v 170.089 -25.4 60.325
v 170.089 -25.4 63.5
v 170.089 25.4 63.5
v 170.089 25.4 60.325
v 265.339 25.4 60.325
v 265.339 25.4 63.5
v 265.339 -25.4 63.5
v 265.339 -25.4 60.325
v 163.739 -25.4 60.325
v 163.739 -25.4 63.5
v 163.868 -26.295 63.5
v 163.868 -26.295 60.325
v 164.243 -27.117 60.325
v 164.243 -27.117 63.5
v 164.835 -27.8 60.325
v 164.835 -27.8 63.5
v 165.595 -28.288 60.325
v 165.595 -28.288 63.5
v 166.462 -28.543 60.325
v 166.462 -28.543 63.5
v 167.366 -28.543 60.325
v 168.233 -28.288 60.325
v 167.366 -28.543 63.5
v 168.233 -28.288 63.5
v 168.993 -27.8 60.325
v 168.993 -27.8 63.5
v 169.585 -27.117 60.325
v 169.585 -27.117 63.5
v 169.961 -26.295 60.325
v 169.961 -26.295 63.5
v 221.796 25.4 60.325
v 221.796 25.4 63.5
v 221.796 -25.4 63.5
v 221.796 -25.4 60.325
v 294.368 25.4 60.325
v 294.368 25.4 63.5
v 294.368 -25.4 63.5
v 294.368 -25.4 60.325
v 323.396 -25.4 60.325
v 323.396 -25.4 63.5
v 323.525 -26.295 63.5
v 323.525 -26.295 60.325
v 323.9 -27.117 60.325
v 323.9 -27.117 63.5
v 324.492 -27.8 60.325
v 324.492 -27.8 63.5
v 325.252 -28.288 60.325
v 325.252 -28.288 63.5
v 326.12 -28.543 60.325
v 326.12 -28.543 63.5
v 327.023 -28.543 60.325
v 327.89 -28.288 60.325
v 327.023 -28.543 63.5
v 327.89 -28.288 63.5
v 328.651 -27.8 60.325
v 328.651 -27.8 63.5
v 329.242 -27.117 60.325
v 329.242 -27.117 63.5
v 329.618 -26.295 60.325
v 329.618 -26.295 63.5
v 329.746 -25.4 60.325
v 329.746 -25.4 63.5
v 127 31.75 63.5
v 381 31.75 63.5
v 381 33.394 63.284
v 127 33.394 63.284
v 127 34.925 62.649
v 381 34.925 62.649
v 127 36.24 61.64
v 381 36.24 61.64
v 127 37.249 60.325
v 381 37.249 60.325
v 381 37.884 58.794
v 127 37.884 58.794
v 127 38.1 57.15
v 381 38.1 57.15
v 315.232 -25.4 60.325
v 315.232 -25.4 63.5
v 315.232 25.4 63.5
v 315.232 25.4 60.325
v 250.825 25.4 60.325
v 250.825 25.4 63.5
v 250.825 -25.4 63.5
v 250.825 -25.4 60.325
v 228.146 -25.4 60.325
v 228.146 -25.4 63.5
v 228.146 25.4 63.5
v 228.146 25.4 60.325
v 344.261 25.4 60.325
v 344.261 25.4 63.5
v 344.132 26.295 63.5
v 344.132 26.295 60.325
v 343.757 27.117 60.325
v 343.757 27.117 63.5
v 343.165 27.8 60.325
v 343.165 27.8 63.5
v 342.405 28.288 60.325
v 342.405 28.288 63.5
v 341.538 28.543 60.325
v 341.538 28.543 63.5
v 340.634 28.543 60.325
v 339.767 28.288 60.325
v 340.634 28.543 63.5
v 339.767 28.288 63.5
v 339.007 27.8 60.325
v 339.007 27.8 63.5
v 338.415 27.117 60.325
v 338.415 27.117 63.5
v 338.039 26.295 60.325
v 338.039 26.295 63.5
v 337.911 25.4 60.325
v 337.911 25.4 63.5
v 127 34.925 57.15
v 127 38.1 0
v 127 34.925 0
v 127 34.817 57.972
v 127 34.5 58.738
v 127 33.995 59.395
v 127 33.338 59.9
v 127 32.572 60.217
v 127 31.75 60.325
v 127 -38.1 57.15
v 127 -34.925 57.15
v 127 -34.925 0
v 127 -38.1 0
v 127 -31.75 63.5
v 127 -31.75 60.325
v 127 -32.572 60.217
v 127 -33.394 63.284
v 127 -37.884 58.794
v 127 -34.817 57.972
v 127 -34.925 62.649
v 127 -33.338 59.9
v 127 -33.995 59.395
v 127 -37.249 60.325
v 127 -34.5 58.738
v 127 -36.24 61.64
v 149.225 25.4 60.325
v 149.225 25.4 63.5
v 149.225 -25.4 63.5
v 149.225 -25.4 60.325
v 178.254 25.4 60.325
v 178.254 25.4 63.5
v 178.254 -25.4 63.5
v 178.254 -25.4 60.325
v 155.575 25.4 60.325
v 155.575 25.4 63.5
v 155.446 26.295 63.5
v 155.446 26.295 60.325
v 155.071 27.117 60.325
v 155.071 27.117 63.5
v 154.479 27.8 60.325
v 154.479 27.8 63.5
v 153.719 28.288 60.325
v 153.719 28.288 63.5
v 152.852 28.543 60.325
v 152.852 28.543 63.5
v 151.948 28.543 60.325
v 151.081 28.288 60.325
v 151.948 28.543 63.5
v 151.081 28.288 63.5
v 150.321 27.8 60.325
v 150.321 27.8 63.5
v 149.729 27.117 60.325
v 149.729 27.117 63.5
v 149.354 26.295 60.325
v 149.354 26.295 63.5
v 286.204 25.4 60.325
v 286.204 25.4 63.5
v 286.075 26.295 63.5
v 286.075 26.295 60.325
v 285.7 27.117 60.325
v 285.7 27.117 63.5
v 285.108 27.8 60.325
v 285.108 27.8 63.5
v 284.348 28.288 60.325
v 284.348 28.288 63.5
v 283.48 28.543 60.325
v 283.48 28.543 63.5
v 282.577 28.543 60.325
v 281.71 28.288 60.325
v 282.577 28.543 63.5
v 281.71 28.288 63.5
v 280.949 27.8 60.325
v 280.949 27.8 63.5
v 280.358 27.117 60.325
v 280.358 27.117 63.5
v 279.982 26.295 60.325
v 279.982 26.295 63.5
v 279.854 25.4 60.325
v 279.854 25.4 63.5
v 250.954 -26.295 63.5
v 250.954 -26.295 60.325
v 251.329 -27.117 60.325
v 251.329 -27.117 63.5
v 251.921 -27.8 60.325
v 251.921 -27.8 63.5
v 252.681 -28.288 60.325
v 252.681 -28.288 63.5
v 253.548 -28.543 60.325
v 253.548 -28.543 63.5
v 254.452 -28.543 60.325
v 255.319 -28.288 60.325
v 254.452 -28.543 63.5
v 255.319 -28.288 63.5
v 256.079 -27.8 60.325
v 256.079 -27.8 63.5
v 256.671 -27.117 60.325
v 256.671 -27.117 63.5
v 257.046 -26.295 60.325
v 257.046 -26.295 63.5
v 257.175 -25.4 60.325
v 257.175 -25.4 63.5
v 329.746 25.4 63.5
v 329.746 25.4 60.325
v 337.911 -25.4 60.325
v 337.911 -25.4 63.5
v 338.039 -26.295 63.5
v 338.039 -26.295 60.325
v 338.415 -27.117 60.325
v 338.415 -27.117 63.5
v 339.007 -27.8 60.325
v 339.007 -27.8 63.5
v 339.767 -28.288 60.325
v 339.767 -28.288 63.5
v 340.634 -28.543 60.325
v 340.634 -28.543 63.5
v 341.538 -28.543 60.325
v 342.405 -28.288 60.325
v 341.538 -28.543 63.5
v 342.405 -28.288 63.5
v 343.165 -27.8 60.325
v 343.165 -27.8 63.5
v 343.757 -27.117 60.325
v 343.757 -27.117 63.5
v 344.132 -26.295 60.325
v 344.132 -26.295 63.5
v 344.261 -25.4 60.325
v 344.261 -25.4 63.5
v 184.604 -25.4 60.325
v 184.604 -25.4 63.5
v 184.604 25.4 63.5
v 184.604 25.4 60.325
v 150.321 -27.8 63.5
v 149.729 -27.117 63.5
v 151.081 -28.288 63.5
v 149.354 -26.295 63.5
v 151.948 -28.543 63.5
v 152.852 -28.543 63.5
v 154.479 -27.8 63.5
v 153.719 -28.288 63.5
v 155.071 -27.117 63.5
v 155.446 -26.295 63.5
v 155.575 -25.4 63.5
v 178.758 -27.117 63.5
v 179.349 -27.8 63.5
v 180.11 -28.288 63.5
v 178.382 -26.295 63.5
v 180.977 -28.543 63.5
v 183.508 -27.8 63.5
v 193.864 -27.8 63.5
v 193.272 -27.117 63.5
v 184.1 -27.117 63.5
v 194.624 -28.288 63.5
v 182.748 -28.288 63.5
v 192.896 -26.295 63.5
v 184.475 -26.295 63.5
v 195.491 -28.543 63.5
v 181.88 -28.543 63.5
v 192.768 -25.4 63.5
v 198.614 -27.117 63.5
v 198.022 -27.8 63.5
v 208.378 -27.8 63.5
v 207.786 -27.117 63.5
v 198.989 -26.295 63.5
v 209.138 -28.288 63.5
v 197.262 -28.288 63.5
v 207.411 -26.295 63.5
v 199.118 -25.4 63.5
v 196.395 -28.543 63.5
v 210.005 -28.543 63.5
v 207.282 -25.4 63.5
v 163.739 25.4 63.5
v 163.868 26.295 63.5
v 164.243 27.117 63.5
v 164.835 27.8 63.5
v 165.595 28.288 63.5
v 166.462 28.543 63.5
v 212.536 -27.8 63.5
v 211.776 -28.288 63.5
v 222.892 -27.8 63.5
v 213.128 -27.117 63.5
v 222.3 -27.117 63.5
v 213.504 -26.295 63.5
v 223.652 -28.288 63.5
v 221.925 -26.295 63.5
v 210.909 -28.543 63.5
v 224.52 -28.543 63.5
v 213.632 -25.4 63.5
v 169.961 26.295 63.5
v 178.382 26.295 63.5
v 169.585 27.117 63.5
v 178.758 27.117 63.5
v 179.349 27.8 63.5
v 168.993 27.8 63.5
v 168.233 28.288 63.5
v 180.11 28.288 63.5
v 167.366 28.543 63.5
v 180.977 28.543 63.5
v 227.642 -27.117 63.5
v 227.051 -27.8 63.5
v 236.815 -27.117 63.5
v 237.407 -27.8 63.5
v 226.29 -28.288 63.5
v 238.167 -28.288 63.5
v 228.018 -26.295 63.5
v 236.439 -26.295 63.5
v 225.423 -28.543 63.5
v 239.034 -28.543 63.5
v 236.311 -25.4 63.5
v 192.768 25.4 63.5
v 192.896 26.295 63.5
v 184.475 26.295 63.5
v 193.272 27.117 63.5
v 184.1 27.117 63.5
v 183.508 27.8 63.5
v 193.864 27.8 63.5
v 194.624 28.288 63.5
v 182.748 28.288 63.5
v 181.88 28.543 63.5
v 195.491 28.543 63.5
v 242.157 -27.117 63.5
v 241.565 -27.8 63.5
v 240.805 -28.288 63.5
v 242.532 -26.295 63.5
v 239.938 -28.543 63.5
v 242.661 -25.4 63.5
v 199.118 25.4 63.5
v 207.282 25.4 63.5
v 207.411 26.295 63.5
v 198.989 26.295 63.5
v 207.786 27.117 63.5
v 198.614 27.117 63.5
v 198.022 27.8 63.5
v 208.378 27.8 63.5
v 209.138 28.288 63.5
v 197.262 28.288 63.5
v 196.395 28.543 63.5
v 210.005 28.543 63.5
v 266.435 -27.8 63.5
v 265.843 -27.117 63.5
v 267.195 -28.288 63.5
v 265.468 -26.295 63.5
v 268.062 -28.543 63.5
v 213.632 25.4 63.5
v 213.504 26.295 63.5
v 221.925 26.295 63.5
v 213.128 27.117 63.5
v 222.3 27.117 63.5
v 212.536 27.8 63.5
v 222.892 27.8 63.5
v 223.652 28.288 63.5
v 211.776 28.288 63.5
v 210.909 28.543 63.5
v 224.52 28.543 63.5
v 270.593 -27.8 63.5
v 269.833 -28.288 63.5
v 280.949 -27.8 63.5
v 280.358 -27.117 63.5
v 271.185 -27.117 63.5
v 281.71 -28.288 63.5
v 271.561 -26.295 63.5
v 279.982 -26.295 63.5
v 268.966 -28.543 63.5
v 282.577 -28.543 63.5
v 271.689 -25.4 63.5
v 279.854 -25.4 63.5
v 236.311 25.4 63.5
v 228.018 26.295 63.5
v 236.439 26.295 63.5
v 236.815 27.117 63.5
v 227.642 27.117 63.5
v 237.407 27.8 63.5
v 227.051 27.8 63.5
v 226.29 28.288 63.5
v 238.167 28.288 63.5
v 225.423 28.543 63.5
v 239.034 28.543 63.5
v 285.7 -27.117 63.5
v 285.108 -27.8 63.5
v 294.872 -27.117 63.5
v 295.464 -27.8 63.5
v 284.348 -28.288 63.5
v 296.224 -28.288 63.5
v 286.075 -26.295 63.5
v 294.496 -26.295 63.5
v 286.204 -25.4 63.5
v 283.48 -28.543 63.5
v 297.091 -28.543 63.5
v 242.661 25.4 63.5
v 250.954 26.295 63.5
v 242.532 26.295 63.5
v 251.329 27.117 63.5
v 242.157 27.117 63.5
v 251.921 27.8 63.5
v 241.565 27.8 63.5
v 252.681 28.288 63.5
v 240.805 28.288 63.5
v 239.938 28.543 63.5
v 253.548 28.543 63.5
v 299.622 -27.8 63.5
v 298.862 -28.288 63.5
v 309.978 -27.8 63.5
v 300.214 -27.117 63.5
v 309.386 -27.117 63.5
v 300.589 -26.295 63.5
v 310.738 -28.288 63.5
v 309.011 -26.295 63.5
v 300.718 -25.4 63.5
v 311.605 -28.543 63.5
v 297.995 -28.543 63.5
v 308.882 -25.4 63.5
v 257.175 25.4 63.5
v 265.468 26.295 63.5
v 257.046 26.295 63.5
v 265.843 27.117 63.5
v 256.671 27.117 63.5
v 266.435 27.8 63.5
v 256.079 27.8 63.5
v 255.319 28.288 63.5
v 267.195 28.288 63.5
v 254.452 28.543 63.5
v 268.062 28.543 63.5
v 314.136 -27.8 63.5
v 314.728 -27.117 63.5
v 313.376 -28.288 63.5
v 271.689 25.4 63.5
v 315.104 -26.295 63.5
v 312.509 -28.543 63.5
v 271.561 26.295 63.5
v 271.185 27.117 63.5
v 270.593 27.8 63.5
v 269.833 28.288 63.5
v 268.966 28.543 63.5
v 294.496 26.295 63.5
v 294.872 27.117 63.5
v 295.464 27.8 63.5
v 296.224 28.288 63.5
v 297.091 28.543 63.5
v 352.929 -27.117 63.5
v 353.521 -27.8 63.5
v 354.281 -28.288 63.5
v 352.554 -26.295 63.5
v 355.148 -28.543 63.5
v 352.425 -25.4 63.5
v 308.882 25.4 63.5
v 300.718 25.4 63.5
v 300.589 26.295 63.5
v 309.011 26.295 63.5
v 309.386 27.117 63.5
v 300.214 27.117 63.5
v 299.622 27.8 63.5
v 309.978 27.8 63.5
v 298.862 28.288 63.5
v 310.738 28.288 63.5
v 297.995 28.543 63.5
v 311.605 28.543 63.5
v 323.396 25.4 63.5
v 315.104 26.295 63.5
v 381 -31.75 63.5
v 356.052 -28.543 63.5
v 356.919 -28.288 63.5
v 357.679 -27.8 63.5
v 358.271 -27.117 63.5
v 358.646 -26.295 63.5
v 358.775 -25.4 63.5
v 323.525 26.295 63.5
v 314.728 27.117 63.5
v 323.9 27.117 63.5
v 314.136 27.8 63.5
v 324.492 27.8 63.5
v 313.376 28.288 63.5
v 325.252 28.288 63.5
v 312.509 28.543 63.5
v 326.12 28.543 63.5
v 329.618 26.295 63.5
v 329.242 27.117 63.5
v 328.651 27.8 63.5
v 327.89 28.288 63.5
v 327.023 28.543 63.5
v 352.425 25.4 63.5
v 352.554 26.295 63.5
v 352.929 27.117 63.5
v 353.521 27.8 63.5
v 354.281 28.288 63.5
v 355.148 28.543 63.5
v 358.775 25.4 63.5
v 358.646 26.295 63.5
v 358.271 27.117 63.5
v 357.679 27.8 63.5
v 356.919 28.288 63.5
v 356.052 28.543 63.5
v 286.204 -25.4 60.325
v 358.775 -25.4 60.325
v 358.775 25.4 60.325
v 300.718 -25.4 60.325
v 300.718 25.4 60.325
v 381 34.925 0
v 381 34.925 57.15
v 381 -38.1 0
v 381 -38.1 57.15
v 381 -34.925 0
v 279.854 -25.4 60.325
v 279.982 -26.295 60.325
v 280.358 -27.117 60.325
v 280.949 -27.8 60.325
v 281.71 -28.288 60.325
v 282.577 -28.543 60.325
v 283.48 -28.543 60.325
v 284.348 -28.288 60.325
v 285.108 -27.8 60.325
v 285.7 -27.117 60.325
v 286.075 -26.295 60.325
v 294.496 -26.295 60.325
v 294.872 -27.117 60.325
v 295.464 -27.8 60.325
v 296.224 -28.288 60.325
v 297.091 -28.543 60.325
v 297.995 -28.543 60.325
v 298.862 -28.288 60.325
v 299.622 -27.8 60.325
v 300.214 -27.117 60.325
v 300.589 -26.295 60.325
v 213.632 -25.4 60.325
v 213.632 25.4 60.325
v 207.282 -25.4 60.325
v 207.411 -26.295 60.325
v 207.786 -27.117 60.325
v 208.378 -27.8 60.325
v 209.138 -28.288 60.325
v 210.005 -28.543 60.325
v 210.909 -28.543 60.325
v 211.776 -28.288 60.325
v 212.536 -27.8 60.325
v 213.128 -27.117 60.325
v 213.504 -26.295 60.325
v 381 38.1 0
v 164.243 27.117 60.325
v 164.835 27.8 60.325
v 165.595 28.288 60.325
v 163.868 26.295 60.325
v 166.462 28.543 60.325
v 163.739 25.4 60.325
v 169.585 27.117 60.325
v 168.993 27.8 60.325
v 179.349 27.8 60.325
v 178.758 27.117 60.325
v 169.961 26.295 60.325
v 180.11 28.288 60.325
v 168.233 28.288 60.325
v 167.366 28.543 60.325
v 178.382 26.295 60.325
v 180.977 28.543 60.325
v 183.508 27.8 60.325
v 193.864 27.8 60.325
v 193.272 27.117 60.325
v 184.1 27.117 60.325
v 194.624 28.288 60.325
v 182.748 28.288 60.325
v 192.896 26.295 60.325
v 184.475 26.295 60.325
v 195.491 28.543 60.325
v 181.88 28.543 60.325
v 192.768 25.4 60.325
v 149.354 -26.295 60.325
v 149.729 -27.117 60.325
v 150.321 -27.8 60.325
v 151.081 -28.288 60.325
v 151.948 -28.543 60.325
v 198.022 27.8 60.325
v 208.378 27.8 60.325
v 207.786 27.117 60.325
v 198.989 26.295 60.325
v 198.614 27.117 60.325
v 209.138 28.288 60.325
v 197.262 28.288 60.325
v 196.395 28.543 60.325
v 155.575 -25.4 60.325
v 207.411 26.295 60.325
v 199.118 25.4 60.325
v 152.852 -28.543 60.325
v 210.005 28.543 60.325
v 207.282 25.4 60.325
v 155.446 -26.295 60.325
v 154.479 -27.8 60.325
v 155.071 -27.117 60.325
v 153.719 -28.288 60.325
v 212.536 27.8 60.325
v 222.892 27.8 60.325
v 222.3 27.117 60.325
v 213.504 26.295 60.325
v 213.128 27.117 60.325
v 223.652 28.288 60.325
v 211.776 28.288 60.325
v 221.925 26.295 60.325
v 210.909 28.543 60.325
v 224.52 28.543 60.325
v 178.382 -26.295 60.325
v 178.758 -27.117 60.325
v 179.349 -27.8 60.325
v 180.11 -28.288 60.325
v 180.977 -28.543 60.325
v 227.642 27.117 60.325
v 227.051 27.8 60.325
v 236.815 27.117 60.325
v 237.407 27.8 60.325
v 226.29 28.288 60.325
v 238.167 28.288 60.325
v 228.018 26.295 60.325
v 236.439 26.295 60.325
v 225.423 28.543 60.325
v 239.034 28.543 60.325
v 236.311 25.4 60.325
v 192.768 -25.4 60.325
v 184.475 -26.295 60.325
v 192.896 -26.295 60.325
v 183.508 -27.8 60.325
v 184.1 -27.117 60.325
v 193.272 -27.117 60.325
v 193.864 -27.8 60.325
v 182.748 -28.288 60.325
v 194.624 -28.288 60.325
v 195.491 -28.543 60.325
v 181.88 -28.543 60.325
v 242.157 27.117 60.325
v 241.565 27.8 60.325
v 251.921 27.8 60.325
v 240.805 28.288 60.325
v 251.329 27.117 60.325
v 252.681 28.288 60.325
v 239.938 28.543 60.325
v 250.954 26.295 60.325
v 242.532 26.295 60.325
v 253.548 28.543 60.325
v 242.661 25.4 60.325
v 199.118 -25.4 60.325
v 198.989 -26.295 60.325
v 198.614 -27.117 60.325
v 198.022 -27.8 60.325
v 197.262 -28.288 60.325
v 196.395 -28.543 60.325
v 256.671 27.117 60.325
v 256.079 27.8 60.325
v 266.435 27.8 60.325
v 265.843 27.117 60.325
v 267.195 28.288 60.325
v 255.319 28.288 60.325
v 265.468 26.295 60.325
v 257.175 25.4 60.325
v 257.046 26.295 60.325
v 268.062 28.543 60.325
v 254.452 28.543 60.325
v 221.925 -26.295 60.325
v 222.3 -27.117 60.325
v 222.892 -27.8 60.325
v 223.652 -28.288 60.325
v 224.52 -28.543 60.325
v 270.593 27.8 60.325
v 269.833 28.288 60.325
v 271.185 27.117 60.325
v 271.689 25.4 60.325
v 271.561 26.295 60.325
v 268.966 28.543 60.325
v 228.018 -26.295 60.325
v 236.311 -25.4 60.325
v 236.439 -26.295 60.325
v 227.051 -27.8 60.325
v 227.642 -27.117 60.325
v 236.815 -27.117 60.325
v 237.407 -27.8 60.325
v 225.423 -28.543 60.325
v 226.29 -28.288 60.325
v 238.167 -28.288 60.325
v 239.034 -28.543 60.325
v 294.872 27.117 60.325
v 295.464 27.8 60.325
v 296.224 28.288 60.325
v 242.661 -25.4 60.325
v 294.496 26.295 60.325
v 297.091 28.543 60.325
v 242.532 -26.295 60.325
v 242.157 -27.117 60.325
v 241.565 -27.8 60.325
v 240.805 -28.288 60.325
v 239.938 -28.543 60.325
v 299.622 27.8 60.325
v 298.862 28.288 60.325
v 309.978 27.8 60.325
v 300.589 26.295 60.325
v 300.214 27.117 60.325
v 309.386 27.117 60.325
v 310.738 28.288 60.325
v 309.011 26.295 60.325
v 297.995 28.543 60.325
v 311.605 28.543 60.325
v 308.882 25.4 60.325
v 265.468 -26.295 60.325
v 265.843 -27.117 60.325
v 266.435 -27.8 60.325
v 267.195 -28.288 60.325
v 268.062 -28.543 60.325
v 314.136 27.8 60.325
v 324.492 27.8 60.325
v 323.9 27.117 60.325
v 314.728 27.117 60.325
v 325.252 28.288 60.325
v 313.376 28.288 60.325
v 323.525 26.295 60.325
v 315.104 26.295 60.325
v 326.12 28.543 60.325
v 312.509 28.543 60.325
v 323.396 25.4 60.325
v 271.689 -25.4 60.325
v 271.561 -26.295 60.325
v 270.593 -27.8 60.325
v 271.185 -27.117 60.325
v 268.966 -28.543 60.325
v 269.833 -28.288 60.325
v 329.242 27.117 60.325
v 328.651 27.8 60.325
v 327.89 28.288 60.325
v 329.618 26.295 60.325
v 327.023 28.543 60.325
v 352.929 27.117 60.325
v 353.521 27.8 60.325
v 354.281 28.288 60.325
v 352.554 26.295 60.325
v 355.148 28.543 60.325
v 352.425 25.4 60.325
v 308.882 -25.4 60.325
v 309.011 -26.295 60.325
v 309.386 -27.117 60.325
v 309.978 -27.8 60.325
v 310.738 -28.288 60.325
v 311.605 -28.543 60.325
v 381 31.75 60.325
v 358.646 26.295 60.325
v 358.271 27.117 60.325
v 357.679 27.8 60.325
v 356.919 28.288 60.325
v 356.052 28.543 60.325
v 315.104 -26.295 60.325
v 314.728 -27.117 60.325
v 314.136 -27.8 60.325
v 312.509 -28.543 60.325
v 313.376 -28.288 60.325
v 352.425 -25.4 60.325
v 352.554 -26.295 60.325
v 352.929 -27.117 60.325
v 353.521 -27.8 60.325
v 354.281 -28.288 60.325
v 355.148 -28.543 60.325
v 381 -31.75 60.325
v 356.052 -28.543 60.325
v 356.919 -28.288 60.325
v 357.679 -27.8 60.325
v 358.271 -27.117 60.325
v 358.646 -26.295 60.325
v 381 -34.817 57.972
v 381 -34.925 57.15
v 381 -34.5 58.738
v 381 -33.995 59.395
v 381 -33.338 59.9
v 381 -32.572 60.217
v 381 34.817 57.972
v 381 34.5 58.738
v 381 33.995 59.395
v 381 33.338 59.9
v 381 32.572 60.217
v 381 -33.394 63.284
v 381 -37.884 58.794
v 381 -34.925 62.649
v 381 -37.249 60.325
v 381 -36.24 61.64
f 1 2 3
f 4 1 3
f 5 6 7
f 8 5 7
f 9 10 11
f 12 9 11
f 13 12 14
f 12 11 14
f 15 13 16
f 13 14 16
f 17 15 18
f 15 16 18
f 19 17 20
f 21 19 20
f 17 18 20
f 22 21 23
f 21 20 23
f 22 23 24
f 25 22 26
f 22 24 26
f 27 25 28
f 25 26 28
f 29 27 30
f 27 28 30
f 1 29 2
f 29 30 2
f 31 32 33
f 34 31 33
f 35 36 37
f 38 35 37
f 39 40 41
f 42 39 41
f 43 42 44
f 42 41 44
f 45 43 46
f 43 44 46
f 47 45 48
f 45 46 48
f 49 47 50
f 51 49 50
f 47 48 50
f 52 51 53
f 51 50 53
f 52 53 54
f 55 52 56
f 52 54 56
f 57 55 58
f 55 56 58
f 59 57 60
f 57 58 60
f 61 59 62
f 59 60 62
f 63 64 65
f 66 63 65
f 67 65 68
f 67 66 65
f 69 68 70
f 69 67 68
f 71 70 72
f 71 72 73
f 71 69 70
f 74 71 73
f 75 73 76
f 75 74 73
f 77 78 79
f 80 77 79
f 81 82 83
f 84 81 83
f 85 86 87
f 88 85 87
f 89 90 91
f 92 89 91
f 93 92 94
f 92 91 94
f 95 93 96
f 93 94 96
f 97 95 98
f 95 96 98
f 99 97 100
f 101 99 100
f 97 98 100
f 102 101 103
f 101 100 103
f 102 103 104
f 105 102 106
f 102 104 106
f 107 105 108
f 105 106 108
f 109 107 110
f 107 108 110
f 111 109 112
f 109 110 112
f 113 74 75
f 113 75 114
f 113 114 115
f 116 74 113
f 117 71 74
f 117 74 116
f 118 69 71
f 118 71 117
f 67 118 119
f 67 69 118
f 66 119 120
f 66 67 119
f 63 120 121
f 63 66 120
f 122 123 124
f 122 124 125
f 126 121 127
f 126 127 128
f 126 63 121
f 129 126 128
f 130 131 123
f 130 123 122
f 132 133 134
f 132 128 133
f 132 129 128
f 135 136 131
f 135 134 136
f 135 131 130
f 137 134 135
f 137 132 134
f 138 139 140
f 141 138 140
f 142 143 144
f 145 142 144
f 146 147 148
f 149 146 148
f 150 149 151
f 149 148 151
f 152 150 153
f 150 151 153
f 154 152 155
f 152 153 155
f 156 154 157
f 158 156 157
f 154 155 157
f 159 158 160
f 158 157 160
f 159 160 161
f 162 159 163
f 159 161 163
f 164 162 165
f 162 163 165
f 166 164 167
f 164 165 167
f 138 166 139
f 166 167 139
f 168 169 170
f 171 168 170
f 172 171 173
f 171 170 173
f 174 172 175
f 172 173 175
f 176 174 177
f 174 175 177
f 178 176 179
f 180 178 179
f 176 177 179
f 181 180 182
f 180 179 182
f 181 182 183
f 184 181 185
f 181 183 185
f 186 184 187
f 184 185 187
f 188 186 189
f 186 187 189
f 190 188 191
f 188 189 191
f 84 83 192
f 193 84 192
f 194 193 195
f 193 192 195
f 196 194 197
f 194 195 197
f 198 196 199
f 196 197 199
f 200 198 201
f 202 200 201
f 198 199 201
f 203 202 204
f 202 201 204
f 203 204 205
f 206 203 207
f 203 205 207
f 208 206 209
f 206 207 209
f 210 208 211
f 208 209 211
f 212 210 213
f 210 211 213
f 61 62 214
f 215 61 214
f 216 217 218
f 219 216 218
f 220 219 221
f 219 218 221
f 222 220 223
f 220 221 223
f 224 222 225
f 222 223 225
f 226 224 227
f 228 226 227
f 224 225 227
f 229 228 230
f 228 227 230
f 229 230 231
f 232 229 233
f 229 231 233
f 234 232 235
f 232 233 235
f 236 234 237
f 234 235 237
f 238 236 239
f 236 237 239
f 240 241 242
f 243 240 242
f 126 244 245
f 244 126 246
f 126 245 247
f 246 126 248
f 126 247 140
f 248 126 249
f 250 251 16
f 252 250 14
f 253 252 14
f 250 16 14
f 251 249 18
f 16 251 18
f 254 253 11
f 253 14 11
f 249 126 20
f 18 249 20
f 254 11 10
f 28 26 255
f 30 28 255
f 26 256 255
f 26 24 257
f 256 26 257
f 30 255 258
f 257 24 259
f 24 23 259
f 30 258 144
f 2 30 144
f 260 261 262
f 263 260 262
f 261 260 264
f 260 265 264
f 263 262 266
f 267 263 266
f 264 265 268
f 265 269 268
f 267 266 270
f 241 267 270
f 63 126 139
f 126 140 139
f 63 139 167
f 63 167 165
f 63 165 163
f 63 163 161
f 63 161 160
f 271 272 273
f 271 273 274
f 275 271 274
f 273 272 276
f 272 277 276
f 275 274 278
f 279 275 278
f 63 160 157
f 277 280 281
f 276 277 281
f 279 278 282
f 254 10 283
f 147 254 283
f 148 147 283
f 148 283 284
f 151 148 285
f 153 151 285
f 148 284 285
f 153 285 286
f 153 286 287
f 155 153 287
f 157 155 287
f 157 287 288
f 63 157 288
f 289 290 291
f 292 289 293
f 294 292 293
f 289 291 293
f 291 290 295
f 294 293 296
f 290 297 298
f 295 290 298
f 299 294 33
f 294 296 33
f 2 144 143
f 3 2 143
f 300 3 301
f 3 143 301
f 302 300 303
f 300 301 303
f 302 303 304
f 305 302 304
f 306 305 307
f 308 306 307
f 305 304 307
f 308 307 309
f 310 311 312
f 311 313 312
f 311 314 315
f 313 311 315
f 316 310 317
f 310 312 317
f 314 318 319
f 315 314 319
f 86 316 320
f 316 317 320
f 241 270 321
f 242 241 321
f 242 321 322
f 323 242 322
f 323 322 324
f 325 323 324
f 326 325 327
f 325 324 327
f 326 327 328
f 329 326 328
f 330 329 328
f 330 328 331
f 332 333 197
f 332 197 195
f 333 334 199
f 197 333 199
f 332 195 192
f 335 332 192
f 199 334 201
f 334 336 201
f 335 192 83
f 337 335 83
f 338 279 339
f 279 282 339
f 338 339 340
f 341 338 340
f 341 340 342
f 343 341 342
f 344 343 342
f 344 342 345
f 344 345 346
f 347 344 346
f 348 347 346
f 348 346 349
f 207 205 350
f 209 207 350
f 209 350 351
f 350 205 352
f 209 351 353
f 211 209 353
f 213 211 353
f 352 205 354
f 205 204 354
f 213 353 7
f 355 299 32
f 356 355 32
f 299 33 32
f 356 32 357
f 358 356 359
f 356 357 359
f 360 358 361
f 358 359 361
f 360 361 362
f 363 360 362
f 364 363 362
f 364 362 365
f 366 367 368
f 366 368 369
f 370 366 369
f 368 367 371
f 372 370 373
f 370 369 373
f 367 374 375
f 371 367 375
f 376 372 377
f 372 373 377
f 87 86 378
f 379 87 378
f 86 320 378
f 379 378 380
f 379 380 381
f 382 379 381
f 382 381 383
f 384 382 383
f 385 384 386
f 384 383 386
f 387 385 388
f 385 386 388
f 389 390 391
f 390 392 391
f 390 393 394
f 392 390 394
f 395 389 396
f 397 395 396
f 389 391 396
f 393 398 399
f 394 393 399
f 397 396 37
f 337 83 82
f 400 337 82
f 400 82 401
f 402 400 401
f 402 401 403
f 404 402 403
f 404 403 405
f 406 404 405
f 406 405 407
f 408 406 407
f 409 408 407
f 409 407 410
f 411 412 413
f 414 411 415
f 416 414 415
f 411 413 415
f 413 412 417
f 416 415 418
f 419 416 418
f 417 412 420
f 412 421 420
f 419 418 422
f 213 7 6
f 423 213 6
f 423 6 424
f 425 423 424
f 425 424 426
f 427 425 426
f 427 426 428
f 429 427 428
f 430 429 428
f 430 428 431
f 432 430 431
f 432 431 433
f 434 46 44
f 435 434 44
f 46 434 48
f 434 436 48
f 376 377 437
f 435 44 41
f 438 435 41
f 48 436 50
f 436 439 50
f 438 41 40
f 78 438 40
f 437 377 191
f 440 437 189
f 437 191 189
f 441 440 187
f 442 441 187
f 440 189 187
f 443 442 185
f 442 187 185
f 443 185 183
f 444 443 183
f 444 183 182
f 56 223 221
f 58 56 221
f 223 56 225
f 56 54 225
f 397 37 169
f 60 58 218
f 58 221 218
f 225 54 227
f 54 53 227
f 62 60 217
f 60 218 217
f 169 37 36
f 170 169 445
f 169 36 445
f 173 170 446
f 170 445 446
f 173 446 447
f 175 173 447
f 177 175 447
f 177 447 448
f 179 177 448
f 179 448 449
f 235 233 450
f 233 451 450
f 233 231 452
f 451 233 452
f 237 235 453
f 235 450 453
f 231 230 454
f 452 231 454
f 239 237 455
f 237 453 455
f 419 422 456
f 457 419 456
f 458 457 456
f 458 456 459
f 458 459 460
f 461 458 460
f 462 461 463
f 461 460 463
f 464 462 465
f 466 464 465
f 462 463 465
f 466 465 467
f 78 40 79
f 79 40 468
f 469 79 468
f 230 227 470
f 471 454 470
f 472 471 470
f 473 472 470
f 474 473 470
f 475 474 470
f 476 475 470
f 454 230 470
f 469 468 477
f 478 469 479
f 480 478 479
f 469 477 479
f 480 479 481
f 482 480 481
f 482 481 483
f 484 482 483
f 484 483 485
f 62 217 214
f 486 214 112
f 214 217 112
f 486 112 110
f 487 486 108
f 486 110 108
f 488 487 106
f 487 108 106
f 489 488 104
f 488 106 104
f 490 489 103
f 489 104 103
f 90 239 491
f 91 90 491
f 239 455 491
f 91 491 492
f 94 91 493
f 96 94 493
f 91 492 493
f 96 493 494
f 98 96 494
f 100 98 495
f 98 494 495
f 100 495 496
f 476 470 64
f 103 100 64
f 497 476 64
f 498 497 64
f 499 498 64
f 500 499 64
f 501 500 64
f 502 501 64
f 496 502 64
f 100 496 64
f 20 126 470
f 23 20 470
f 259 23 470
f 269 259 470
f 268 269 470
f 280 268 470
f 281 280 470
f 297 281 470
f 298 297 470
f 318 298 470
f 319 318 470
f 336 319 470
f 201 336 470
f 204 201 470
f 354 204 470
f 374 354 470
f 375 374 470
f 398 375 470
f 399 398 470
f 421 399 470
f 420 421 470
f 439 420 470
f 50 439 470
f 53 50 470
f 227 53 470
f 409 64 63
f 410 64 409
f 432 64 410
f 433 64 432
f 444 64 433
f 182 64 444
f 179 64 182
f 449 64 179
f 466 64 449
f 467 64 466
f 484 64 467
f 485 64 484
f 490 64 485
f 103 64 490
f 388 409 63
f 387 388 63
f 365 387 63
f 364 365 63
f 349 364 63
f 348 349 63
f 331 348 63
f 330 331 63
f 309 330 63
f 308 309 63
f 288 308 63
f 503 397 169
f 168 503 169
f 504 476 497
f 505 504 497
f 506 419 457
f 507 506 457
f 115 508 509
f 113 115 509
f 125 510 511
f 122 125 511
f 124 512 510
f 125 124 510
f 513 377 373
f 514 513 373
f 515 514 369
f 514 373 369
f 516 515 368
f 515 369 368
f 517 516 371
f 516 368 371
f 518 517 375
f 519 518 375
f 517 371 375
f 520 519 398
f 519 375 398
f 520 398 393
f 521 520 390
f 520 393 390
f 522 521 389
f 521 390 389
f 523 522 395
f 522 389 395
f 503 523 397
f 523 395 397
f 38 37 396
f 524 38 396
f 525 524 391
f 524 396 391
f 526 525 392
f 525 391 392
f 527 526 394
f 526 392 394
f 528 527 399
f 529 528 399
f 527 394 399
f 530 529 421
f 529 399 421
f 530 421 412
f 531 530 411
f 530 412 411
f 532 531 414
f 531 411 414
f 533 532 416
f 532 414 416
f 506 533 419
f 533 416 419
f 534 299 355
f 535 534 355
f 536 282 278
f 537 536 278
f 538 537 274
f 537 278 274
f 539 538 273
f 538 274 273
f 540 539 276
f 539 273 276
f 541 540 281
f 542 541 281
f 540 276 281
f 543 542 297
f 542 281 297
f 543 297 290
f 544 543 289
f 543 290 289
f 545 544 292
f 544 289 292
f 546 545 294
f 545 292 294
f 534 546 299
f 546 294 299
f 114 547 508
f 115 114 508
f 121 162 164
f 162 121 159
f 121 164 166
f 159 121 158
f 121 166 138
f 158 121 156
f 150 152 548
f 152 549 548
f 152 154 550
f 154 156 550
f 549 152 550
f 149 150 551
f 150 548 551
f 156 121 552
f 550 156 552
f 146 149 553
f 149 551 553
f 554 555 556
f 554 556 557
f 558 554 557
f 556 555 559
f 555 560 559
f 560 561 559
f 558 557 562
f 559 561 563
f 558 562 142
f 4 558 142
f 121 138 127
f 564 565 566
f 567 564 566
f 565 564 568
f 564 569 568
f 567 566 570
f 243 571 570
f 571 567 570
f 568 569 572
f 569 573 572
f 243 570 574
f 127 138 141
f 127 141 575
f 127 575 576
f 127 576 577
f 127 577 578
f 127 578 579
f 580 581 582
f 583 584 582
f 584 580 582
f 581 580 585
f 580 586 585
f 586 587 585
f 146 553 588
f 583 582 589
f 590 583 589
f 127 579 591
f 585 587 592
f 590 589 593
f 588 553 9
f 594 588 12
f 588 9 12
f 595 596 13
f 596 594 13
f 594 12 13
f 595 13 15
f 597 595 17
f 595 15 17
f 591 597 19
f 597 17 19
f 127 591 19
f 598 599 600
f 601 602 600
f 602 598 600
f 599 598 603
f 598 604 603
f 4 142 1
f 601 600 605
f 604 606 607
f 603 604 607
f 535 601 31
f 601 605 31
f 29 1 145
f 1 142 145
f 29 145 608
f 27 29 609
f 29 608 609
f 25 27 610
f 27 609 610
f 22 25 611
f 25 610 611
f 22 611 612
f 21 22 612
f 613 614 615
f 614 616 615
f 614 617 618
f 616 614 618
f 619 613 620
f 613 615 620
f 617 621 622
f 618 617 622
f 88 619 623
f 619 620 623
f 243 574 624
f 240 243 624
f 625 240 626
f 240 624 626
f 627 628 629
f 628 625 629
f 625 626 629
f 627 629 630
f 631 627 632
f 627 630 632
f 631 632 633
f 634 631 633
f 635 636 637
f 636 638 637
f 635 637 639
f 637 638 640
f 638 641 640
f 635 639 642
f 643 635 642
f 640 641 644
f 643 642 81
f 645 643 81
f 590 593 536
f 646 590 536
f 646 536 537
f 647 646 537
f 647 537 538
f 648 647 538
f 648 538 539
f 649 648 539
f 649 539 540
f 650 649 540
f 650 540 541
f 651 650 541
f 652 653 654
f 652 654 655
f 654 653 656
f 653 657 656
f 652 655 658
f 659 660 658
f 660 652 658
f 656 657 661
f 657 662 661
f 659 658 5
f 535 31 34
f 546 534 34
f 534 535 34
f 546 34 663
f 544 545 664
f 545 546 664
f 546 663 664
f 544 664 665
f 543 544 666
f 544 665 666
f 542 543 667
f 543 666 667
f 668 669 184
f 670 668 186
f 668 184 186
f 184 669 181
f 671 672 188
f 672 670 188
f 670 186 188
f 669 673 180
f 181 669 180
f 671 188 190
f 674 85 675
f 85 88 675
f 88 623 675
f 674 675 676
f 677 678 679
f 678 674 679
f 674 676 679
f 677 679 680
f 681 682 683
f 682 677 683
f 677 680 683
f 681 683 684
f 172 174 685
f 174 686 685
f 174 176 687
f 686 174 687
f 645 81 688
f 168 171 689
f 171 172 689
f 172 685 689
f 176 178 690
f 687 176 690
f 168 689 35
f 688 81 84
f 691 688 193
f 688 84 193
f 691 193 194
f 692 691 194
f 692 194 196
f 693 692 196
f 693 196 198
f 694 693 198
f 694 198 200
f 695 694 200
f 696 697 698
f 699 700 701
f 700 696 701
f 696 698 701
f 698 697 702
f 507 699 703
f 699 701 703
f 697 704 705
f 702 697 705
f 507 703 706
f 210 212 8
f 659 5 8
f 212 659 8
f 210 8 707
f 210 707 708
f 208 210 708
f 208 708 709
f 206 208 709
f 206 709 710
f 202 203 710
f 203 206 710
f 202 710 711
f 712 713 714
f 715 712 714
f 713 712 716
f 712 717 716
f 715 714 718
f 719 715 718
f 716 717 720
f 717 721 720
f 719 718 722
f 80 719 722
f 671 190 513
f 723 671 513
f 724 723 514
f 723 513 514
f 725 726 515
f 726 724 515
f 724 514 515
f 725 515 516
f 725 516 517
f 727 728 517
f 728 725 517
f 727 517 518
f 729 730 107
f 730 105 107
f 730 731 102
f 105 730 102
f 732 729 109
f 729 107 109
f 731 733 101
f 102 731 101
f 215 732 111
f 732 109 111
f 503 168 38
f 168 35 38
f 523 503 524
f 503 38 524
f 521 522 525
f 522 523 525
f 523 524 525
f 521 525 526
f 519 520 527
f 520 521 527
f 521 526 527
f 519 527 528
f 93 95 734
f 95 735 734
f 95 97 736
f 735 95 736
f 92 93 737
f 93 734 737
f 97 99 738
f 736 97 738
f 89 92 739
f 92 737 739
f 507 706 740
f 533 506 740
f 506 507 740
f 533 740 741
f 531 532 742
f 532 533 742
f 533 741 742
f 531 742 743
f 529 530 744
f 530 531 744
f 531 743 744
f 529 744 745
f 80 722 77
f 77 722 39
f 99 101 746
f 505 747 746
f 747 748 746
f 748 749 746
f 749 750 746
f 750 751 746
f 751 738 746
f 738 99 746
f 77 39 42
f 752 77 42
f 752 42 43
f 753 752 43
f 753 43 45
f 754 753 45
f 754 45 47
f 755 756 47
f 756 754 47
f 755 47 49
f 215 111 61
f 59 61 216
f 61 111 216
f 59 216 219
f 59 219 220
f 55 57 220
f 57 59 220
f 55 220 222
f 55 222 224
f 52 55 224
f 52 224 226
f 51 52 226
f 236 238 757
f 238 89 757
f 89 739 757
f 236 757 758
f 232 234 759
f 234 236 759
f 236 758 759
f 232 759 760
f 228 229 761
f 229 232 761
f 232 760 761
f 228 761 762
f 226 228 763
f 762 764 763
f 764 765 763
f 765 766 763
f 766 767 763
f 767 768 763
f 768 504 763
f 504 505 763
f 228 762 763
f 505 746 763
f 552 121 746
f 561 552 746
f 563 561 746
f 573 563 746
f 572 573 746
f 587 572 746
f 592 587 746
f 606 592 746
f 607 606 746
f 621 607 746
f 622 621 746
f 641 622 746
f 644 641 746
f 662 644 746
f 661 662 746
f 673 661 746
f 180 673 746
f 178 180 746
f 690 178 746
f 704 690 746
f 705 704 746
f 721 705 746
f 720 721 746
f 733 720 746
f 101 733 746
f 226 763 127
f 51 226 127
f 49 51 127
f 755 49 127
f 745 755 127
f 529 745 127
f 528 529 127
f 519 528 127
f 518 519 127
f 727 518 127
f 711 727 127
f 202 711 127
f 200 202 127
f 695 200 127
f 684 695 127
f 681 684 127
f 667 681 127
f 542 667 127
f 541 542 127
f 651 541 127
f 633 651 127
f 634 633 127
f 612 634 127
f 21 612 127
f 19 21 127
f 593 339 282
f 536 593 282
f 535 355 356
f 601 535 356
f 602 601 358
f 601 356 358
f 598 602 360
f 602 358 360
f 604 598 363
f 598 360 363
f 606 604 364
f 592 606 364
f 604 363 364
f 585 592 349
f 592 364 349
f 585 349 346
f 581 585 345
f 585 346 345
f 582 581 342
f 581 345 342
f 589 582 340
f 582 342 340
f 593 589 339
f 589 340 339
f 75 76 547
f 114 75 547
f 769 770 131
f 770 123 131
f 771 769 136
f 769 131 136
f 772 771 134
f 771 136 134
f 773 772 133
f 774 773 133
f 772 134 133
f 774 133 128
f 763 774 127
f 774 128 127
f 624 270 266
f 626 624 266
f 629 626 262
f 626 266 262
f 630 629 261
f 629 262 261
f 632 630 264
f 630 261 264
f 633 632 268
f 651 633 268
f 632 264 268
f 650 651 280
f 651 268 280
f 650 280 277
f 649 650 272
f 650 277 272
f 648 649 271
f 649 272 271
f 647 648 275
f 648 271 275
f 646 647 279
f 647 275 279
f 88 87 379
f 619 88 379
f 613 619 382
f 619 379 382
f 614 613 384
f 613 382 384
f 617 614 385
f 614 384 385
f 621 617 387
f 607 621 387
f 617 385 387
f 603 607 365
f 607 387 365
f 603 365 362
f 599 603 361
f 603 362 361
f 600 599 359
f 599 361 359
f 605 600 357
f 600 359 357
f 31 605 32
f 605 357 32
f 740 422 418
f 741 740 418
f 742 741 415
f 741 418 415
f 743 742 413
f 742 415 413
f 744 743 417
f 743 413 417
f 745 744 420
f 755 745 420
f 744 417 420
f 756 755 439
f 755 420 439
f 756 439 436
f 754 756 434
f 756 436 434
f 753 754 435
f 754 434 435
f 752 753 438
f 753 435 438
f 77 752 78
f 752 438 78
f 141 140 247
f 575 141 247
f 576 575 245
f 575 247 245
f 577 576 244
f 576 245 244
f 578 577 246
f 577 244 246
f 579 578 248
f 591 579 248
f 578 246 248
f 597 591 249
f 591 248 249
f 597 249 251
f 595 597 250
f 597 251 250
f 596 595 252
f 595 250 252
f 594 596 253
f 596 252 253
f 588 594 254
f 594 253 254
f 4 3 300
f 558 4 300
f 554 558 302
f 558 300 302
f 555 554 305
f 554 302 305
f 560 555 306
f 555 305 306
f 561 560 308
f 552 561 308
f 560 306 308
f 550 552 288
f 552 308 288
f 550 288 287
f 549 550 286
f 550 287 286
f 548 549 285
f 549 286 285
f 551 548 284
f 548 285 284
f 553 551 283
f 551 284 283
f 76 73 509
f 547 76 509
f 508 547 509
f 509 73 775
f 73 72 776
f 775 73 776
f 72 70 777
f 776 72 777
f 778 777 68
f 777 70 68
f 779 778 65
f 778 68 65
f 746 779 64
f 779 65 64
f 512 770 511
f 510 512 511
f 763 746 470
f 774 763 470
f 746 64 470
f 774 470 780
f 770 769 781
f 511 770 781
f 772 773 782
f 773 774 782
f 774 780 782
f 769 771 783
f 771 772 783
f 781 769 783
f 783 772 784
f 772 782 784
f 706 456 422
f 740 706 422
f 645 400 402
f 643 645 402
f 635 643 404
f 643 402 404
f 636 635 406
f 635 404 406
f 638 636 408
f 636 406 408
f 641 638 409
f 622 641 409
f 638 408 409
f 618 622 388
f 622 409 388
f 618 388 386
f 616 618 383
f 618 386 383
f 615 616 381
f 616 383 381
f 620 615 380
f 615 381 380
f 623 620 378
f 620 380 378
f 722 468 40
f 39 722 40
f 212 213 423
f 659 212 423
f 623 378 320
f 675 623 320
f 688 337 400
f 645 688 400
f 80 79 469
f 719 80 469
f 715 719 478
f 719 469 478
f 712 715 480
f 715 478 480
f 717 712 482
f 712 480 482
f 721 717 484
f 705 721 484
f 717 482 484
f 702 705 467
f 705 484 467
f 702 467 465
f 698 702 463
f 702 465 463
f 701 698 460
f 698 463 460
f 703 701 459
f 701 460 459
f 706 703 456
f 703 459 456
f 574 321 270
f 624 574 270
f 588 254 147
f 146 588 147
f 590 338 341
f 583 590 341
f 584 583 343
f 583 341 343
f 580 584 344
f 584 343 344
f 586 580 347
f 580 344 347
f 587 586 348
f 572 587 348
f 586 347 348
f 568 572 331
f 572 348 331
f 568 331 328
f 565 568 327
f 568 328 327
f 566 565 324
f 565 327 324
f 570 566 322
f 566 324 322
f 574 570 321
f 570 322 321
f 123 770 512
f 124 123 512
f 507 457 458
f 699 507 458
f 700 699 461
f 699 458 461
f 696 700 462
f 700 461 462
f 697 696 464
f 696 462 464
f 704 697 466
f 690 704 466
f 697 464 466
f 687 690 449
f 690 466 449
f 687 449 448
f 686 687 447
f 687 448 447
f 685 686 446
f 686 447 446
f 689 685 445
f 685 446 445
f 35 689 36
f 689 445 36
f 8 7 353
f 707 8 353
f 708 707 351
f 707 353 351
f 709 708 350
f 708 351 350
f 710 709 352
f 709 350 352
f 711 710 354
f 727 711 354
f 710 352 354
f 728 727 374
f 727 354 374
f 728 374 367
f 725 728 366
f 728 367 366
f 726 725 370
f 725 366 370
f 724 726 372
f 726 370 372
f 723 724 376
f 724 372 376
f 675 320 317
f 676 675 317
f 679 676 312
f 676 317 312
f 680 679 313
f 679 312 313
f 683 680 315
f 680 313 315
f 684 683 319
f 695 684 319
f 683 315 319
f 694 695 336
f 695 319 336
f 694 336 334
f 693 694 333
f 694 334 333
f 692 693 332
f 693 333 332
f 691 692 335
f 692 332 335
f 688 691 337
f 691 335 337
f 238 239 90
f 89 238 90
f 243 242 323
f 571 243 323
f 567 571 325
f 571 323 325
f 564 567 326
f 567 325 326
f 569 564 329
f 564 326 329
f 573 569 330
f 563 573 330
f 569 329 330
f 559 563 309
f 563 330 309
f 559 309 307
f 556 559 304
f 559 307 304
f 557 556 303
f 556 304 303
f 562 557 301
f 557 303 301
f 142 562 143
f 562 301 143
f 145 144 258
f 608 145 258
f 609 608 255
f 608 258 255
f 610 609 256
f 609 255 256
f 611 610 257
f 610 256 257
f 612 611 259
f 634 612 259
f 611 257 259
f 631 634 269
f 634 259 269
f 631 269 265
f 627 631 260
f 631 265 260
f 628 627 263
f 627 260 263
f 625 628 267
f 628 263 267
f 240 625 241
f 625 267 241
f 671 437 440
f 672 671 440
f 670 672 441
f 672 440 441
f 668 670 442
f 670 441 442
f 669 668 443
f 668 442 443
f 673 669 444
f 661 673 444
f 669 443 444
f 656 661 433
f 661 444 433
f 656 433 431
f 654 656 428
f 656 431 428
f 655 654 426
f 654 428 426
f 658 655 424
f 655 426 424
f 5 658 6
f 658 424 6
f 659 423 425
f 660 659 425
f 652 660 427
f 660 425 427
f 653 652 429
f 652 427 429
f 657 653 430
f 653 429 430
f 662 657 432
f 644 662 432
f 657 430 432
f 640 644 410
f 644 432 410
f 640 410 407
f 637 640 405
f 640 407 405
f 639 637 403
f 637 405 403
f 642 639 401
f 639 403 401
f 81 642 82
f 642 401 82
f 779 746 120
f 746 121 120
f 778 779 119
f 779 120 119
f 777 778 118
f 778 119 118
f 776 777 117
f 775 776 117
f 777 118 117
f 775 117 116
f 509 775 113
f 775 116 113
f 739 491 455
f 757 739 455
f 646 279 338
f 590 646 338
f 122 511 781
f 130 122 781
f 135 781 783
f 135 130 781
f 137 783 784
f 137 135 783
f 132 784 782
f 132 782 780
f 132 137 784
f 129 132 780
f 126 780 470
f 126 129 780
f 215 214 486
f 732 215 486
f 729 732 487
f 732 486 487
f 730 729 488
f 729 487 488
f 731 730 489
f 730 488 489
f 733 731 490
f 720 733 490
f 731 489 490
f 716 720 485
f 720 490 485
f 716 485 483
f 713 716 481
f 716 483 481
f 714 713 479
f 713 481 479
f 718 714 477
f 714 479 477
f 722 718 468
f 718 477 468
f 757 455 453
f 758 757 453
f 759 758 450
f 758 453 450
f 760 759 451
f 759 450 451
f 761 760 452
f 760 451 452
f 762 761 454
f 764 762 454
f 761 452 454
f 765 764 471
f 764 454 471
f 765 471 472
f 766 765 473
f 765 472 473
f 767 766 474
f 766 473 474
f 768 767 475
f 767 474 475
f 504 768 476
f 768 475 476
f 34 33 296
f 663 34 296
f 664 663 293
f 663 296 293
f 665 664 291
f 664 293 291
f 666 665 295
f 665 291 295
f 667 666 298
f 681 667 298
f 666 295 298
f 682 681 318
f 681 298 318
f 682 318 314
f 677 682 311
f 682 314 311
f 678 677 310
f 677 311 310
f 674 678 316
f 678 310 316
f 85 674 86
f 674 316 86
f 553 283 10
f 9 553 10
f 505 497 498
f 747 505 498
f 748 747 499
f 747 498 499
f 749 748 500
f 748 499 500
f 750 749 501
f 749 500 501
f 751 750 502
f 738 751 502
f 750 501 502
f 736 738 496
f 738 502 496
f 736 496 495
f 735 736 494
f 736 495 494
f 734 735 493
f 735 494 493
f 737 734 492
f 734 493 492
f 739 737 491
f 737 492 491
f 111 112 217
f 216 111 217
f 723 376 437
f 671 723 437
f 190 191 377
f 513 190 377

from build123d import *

# Parameters (mm, degrees)
PAD7367_DEPTH          = 254
POCKET686_DEPTH        = 63.501
LINEARPATTERN003_COUNT = 15
LINEARPATTERN003_PITCH = 14.514286
FILLET569_R            = 6.35
FILLET570_R            = 3.175


with BuildPart() as part:
    # Sketch8382 → Pad7367 (new body)
    with BuildSketch(Plane.YZ):
        Polygon((-38.1, -63.5), (-38.1, 0), (38.1, 0), (38.1, -63.5), (34.925, -63.5), (34.925, -3.175), (-34.925, -3.175), (-34.925, -63.5), align=None)
    extrude(amount=-PAD7367_DEPTH)

    # Sketch8384 → Pocket686 (cut, through all)
    with BuildSketch(Plane.XY):
        with BuildLine():
            ThreePointArc((-28.575, -25.4), (-25.4, -28.575), (-22.225, -25.4))
            Line((-22.225, -25.4), (-22.225, 25.4))
            ThreePointArc((-22.225, 25.4), (-25.4, 28.575), (-28.575, 25.4))
            Line((-28.575, 25.4), (-28.575, -25.4))
        make_face()
    pocket686 = extrude(amount=-POCKET686_DEPTH, mode=Mode.SUBTRACT)

    # LinearPattern003: Pocket686 ×15
    with Locations(*[(-i * LINEARPATTERN003_PITCH, 0, 0) for i in range(1, LINEARPATTERN003_COUNT)]):
        add(pocket686, mode=Mode.SUBTRACT)

    # Fillet569
    fillet569_edges = [part.edges().sort_by_distance(p)[0] for p in [
        (-127, -38.1, 0),
        (-127, 38.1, 0),
    ]]
    fillet(fillet569_edges, radius=FILLET569_R)

    # Fillet570
    fillet570_edges = [part.edges().sort_by_distance(p)[0] for p in [
        (-127, -34.925, -3.175),
        (-127, 34.925, -3.175),
    ]]
    fillet(fillet570_edges, radius=FILLET570_R)


with BuildPart() as part_1:
    # Body6681 placement: moved
    add(part.part.moved(Location((381, 0, 63.5))))


solid = part_1.part
